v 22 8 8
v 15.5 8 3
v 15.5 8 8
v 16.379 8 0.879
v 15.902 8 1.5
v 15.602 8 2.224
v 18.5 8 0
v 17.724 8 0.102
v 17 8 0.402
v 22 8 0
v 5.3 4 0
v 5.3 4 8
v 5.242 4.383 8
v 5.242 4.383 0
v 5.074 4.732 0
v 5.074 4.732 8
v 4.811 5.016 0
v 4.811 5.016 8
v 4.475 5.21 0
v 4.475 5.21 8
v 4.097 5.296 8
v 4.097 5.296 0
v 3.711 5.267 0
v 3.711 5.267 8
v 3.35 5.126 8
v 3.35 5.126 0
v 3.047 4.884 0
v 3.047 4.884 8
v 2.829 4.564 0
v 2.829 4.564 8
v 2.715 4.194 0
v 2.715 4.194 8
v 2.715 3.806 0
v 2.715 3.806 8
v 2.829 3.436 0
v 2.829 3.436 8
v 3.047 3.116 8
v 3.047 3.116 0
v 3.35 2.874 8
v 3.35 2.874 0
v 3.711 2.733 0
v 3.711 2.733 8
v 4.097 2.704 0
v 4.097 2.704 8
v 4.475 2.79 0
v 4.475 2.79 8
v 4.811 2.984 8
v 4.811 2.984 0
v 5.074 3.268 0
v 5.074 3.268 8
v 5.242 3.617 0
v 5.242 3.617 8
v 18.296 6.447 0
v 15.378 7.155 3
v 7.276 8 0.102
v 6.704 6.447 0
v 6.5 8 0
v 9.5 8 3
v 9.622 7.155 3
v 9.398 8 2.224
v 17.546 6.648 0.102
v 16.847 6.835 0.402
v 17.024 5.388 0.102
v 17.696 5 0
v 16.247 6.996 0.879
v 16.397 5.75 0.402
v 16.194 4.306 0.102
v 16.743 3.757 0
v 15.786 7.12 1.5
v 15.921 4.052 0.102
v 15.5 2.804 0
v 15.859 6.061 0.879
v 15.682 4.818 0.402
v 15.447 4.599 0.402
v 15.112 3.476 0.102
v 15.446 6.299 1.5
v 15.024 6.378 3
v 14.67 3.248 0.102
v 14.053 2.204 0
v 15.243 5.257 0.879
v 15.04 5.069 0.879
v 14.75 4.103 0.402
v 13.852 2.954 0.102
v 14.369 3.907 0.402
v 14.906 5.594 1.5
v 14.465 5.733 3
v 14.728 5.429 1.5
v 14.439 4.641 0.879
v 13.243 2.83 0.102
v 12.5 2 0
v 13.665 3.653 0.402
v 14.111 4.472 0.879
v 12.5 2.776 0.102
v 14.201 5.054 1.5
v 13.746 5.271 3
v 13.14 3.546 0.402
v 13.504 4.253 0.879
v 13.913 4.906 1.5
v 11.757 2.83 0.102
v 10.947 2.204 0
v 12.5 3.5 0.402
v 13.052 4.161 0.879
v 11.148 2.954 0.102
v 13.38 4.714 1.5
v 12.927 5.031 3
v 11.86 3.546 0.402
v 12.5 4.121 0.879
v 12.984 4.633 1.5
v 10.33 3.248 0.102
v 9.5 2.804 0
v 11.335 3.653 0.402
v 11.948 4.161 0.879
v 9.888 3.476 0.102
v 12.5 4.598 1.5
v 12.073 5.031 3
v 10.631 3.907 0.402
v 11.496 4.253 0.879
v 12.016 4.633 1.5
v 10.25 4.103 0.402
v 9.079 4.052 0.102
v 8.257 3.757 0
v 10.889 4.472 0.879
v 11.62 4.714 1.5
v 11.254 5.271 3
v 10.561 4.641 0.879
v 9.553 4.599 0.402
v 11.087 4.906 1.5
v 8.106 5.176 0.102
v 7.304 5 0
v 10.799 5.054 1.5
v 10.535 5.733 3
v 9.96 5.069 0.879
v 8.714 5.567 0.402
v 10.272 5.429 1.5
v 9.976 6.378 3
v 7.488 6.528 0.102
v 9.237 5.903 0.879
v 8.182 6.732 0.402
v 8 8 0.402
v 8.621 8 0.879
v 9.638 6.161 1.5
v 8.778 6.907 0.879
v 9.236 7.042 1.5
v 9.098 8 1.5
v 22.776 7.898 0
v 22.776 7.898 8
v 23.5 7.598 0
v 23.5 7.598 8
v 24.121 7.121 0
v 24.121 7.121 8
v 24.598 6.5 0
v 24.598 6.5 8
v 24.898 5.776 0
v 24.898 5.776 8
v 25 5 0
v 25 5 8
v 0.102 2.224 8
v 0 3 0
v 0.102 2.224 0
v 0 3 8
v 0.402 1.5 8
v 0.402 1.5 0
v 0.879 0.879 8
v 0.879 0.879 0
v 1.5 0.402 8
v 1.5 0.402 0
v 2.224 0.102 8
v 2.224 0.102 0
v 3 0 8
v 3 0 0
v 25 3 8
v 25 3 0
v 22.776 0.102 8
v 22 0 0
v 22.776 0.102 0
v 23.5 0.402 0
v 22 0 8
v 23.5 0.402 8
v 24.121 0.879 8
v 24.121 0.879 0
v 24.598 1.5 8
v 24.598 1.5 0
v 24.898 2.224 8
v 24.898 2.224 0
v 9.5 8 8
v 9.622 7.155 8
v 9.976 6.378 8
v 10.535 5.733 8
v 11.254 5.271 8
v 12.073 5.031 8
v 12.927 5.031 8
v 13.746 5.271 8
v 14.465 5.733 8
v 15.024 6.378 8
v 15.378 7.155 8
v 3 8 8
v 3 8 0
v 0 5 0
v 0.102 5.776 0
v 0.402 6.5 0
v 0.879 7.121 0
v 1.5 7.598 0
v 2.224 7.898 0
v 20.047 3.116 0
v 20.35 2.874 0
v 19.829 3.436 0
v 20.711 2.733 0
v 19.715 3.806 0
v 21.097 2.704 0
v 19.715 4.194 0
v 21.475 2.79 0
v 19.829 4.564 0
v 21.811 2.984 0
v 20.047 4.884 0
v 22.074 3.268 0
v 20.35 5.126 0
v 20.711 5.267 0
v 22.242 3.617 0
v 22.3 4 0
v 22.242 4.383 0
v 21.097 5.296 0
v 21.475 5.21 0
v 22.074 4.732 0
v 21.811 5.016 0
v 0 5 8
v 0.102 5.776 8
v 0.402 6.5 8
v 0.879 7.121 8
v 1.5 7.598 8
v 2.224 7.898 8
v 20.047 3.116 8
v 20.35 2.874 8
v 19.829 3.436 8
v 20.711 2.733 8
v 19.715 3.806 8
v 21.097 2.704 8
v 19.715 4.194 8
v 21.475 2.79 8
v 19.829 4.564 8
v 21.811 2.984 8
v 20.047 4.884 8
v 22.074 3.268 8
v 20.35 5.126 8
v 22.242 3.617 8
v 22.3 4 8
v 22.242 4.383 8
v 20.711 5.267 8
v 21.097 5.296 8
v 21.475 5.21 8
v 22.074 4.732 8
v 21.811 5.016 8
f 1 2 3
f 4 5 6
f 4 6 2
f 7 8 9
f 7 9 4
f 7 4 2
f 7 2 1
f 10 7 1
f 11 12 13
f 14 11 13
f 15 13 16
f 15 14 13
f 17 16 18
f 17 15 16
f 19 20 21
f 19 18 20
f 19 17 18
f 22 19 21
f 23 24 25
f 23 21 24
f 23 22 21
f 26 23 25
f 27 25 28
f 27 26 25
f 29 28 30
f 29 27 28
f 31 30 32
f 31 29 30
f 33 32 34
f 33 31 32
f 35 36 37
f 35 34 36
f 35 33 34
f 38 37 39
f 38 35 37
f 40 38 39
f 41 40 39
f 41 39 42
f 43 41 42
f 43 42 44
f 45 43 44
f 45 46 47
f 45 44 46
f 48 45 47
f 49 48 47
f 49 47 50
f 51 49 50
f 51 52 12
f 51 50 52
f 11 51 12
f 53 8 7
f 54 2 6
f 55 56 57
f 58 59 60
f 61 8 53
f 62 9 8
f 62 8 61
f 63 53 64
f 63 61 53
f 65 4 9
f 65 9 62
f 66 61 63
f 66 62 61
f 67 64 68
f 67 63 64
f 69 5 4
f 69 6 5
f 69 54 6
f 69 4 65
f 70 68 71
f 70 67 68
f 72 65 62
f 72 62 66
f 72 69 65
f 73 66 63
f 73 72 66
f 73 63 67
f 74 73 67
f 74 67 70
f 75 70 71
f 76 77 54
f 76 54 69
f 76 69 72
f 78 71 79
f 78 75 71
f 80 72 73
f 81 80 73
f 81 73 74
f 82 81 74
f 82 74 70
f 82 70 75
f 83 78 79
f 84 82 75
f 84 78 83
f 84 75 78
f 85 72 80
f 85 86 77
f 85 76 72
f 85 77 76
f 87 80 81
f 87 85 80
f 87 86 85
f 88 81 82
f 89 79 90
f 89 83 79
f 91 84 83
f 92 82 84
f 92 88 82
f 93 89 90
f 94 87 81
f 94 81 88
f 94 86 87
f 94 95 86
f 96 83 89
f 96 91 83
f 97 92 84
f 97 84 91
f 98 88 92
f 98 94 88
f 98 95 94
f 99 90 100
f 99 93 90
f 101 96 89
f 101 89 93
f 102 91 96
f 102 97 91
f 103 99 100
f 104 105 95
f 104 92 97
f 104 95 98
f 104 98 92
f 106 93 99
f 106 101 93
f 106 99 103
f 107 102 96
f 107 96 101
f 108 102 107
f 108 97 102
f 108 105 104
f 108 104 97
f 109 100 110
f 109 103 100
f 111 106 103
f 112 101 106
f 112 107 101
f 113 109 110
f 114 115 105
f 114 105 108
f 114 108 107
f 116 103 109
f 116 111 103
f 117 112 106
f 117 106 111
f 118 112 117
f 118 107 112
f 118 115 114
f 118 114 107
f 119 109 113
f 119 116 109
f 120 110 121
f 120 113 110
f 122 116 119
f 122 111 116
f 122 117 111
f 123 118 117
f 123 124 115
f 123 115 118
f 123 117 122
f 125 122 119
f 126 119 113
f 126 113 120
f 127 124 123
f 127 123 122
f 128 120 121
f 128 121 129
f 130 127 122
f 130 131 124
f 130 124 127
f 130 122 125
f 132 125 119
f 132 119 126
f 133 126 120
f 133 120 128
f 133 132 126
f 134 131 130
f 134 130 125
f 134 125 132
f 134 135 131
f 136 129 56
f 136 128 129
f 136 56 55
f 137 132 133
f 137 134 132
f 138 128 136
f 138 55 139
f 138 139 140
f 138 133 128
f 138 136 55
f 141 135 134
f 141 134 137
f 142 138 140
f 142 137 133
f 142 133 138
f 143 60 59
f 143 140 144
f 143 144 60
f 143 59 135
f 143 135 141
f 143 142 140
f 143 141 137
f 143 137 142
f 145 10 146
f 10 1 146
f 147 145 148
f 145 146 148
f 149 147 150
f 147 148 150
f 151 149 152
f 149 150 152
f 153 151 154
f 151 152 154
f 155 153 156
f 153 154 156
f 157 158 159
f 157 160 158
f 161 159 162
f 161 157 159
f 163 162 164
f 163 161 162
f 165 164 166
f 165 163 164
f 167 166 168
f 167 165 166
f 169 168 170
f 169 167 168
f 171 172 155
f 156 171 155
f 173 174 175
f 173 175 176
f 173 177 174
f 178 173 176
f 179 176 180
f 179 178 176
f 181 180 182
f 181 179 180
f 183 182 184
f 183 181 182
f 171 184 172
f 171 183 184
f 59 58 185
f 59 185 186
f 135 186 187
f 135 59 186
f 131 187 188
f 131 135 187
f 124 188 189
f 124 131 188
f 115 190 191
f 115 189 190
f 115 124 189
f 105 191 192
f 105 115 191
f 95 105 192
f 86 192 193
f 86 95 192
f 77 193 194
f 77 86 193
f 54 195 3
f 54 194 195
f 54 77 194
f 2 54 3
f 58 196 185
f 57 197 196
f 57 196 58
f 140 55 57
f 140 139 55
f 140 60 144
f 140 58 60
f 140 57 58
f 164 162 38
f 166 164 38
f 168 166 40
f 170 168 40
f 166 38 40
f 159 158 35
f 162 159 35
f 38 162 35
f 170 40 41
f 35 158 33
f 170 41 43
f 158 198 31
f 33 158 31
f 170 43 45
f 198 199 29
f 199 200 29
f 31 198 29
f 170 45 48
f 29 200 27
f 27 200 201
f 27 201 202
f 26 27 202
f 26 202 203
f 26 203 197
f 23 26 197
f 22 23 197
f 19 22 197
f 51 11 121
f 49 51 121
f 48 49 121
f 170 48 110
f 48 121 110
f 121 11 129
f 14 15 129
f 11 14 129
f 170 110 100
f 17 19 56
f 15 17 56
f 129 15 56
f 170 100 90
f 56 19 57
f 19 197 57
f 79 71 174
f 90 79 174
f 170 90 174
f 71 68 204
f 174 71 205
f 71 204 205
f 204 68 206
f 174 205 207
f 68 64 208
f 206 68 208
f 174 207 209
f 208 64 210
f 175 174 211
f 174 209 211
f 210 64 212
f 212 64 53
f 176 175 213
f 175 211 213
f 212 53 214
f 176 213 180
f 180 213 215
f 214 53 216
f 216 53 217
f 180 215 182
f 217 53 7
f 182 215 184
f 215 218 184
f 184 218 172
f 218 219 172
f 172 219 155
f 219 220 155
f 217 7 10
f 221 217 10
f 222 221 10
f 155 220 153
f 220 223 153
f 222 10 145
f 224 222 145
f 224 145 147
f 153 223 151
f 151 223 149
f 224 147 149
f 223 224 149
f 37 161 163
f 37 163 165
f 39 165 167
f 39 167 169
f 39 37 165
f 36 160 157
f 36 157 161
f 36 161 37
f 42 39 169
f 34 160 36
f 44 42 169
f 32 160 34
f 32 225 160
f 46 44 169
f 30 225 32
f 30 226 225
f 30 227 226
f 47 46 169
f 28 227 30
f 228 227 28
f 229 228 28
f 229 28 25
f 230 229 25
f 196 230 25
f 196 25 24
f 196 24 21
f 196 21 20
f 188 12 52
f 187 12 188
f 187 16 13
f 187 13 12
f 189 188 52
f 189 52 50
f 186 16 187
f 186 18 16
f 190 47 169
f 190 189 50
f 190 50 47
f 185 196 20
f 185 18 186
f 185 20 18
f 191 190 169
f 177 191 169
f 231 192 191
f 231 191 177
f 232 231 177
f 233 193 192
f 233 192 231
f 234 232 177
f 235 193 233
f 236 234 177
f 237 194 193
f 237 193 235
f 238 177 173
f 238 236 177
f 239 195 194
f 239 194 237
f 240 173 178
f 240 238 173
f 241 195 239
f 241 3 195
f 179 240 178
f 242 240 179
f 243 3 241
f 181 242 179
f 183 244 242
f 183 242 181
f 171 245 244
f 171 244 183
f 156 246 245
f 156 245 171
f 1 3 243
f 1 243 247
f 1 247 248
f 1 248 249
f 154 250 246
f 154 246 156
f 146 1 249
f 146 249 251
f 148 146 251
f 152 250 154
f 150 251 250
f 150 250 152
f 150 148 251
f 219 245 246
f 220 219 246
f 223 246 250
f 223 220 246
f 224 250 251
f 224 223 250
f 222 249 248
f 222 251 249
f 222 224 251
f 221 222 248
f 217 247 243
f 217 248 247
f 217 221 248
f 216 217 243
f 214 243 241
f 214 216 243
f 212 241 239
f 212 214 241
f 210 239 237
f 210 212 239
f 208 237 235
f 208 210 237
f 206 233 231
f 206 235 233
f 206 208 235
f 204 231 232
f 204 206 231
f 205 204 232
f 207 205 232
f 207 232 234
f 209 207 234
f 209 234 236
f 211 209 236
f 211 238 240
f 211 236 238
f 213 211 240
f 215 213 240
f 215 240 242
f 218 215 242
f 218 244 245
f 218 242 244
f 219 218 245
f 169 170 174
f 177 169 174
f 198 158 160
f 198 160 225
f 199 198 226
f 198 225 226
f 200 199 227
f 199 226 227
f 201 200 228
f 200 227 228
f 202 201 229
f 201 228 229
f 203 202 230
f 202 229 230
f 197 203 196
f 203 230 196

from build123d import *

# Parameters (mm, degrees)
CYLINDER002_R     = 3
CYLINDER002_DEPTH = 10
CYLINDER001_R     = 1.3
CYLINDER001_DEPTH = 10
CYLINDER_R        = 1.3
CYLINDER_DEPTH    = 10
BOX_W             = 25
BOX_H             = 8
BOX_DEPTH         = 8
FILLET_R          = 3
FILLET001_R       = 3


with BuildPart() as cylinder002:
    # Cylinder002 → Cylinder002 (new body)
    with BuildSketch(Plane(origin=(12.5, 8, -1), x_dir=(1, 0, 0), z_dir=(0, 0, 1))):
        Circle(CYLINDER002_R)
    extrude(amount=CYLINDER002_DEPTH)


with BuildPart() as cylinder001:
    # Cylinder001 → Cylinder001 (new body)
    with BuildSketch(Plane(origin=(21, 4, -1), x_dir=(1, 0, 0), z_dir=(0, 0, 1))):
        Circle(CYLINDER001_R)
    extrude(amount=CYLINDER001_DEPTH)


with BuildPart() as fusion:
    # Cylinder → Cylinder (new body)
    with BuildSketch(Plane(origin=(4, 4, -1), x_dir=(1, 0, 0), z_dir=(0, 0, 1))):
        Circle(CYLINDER_R)
    extrude(amount=CYLINDER_DEPTH)

    # Fusion: union Cylinder001
    add(cylinder001.part)


with BuildPart() as fillet001:
    # Box → Box (new body)
    with BuildSketch(Plane.XY):
        with Locations((12.5, 4)):
            Rectangle(BOX_W, BOX_H)
    extrude(amount=BOX_DEPTH)

    # Cut: cut Fusion
    add(fusion.part, mode=Mode.SUBTRACT)

    # Fillet
    fillet_edges = [fillet001.edges().sort_by_distance(p)[0] for p in [
        (0, 0, 4),
        (0, 8, 4),
        (25, 0, 4),
        (25, 8, 4),
    ]]
    fillet(fillet_edges, radius=FILLET_R)

    # Cut001: cut Cylinder002
    add(cylinder002.part, mode=Mode.SUBTRACT)

    # Fillet001
    fillet001_edges = [fillet001.edges().sort_by_distance(p)[0] for p in [
        (12.5, 5, 0),
    ]]
    fillet(fillet001_edges, radius=FILLET001_R)


solid = fillet001.part
